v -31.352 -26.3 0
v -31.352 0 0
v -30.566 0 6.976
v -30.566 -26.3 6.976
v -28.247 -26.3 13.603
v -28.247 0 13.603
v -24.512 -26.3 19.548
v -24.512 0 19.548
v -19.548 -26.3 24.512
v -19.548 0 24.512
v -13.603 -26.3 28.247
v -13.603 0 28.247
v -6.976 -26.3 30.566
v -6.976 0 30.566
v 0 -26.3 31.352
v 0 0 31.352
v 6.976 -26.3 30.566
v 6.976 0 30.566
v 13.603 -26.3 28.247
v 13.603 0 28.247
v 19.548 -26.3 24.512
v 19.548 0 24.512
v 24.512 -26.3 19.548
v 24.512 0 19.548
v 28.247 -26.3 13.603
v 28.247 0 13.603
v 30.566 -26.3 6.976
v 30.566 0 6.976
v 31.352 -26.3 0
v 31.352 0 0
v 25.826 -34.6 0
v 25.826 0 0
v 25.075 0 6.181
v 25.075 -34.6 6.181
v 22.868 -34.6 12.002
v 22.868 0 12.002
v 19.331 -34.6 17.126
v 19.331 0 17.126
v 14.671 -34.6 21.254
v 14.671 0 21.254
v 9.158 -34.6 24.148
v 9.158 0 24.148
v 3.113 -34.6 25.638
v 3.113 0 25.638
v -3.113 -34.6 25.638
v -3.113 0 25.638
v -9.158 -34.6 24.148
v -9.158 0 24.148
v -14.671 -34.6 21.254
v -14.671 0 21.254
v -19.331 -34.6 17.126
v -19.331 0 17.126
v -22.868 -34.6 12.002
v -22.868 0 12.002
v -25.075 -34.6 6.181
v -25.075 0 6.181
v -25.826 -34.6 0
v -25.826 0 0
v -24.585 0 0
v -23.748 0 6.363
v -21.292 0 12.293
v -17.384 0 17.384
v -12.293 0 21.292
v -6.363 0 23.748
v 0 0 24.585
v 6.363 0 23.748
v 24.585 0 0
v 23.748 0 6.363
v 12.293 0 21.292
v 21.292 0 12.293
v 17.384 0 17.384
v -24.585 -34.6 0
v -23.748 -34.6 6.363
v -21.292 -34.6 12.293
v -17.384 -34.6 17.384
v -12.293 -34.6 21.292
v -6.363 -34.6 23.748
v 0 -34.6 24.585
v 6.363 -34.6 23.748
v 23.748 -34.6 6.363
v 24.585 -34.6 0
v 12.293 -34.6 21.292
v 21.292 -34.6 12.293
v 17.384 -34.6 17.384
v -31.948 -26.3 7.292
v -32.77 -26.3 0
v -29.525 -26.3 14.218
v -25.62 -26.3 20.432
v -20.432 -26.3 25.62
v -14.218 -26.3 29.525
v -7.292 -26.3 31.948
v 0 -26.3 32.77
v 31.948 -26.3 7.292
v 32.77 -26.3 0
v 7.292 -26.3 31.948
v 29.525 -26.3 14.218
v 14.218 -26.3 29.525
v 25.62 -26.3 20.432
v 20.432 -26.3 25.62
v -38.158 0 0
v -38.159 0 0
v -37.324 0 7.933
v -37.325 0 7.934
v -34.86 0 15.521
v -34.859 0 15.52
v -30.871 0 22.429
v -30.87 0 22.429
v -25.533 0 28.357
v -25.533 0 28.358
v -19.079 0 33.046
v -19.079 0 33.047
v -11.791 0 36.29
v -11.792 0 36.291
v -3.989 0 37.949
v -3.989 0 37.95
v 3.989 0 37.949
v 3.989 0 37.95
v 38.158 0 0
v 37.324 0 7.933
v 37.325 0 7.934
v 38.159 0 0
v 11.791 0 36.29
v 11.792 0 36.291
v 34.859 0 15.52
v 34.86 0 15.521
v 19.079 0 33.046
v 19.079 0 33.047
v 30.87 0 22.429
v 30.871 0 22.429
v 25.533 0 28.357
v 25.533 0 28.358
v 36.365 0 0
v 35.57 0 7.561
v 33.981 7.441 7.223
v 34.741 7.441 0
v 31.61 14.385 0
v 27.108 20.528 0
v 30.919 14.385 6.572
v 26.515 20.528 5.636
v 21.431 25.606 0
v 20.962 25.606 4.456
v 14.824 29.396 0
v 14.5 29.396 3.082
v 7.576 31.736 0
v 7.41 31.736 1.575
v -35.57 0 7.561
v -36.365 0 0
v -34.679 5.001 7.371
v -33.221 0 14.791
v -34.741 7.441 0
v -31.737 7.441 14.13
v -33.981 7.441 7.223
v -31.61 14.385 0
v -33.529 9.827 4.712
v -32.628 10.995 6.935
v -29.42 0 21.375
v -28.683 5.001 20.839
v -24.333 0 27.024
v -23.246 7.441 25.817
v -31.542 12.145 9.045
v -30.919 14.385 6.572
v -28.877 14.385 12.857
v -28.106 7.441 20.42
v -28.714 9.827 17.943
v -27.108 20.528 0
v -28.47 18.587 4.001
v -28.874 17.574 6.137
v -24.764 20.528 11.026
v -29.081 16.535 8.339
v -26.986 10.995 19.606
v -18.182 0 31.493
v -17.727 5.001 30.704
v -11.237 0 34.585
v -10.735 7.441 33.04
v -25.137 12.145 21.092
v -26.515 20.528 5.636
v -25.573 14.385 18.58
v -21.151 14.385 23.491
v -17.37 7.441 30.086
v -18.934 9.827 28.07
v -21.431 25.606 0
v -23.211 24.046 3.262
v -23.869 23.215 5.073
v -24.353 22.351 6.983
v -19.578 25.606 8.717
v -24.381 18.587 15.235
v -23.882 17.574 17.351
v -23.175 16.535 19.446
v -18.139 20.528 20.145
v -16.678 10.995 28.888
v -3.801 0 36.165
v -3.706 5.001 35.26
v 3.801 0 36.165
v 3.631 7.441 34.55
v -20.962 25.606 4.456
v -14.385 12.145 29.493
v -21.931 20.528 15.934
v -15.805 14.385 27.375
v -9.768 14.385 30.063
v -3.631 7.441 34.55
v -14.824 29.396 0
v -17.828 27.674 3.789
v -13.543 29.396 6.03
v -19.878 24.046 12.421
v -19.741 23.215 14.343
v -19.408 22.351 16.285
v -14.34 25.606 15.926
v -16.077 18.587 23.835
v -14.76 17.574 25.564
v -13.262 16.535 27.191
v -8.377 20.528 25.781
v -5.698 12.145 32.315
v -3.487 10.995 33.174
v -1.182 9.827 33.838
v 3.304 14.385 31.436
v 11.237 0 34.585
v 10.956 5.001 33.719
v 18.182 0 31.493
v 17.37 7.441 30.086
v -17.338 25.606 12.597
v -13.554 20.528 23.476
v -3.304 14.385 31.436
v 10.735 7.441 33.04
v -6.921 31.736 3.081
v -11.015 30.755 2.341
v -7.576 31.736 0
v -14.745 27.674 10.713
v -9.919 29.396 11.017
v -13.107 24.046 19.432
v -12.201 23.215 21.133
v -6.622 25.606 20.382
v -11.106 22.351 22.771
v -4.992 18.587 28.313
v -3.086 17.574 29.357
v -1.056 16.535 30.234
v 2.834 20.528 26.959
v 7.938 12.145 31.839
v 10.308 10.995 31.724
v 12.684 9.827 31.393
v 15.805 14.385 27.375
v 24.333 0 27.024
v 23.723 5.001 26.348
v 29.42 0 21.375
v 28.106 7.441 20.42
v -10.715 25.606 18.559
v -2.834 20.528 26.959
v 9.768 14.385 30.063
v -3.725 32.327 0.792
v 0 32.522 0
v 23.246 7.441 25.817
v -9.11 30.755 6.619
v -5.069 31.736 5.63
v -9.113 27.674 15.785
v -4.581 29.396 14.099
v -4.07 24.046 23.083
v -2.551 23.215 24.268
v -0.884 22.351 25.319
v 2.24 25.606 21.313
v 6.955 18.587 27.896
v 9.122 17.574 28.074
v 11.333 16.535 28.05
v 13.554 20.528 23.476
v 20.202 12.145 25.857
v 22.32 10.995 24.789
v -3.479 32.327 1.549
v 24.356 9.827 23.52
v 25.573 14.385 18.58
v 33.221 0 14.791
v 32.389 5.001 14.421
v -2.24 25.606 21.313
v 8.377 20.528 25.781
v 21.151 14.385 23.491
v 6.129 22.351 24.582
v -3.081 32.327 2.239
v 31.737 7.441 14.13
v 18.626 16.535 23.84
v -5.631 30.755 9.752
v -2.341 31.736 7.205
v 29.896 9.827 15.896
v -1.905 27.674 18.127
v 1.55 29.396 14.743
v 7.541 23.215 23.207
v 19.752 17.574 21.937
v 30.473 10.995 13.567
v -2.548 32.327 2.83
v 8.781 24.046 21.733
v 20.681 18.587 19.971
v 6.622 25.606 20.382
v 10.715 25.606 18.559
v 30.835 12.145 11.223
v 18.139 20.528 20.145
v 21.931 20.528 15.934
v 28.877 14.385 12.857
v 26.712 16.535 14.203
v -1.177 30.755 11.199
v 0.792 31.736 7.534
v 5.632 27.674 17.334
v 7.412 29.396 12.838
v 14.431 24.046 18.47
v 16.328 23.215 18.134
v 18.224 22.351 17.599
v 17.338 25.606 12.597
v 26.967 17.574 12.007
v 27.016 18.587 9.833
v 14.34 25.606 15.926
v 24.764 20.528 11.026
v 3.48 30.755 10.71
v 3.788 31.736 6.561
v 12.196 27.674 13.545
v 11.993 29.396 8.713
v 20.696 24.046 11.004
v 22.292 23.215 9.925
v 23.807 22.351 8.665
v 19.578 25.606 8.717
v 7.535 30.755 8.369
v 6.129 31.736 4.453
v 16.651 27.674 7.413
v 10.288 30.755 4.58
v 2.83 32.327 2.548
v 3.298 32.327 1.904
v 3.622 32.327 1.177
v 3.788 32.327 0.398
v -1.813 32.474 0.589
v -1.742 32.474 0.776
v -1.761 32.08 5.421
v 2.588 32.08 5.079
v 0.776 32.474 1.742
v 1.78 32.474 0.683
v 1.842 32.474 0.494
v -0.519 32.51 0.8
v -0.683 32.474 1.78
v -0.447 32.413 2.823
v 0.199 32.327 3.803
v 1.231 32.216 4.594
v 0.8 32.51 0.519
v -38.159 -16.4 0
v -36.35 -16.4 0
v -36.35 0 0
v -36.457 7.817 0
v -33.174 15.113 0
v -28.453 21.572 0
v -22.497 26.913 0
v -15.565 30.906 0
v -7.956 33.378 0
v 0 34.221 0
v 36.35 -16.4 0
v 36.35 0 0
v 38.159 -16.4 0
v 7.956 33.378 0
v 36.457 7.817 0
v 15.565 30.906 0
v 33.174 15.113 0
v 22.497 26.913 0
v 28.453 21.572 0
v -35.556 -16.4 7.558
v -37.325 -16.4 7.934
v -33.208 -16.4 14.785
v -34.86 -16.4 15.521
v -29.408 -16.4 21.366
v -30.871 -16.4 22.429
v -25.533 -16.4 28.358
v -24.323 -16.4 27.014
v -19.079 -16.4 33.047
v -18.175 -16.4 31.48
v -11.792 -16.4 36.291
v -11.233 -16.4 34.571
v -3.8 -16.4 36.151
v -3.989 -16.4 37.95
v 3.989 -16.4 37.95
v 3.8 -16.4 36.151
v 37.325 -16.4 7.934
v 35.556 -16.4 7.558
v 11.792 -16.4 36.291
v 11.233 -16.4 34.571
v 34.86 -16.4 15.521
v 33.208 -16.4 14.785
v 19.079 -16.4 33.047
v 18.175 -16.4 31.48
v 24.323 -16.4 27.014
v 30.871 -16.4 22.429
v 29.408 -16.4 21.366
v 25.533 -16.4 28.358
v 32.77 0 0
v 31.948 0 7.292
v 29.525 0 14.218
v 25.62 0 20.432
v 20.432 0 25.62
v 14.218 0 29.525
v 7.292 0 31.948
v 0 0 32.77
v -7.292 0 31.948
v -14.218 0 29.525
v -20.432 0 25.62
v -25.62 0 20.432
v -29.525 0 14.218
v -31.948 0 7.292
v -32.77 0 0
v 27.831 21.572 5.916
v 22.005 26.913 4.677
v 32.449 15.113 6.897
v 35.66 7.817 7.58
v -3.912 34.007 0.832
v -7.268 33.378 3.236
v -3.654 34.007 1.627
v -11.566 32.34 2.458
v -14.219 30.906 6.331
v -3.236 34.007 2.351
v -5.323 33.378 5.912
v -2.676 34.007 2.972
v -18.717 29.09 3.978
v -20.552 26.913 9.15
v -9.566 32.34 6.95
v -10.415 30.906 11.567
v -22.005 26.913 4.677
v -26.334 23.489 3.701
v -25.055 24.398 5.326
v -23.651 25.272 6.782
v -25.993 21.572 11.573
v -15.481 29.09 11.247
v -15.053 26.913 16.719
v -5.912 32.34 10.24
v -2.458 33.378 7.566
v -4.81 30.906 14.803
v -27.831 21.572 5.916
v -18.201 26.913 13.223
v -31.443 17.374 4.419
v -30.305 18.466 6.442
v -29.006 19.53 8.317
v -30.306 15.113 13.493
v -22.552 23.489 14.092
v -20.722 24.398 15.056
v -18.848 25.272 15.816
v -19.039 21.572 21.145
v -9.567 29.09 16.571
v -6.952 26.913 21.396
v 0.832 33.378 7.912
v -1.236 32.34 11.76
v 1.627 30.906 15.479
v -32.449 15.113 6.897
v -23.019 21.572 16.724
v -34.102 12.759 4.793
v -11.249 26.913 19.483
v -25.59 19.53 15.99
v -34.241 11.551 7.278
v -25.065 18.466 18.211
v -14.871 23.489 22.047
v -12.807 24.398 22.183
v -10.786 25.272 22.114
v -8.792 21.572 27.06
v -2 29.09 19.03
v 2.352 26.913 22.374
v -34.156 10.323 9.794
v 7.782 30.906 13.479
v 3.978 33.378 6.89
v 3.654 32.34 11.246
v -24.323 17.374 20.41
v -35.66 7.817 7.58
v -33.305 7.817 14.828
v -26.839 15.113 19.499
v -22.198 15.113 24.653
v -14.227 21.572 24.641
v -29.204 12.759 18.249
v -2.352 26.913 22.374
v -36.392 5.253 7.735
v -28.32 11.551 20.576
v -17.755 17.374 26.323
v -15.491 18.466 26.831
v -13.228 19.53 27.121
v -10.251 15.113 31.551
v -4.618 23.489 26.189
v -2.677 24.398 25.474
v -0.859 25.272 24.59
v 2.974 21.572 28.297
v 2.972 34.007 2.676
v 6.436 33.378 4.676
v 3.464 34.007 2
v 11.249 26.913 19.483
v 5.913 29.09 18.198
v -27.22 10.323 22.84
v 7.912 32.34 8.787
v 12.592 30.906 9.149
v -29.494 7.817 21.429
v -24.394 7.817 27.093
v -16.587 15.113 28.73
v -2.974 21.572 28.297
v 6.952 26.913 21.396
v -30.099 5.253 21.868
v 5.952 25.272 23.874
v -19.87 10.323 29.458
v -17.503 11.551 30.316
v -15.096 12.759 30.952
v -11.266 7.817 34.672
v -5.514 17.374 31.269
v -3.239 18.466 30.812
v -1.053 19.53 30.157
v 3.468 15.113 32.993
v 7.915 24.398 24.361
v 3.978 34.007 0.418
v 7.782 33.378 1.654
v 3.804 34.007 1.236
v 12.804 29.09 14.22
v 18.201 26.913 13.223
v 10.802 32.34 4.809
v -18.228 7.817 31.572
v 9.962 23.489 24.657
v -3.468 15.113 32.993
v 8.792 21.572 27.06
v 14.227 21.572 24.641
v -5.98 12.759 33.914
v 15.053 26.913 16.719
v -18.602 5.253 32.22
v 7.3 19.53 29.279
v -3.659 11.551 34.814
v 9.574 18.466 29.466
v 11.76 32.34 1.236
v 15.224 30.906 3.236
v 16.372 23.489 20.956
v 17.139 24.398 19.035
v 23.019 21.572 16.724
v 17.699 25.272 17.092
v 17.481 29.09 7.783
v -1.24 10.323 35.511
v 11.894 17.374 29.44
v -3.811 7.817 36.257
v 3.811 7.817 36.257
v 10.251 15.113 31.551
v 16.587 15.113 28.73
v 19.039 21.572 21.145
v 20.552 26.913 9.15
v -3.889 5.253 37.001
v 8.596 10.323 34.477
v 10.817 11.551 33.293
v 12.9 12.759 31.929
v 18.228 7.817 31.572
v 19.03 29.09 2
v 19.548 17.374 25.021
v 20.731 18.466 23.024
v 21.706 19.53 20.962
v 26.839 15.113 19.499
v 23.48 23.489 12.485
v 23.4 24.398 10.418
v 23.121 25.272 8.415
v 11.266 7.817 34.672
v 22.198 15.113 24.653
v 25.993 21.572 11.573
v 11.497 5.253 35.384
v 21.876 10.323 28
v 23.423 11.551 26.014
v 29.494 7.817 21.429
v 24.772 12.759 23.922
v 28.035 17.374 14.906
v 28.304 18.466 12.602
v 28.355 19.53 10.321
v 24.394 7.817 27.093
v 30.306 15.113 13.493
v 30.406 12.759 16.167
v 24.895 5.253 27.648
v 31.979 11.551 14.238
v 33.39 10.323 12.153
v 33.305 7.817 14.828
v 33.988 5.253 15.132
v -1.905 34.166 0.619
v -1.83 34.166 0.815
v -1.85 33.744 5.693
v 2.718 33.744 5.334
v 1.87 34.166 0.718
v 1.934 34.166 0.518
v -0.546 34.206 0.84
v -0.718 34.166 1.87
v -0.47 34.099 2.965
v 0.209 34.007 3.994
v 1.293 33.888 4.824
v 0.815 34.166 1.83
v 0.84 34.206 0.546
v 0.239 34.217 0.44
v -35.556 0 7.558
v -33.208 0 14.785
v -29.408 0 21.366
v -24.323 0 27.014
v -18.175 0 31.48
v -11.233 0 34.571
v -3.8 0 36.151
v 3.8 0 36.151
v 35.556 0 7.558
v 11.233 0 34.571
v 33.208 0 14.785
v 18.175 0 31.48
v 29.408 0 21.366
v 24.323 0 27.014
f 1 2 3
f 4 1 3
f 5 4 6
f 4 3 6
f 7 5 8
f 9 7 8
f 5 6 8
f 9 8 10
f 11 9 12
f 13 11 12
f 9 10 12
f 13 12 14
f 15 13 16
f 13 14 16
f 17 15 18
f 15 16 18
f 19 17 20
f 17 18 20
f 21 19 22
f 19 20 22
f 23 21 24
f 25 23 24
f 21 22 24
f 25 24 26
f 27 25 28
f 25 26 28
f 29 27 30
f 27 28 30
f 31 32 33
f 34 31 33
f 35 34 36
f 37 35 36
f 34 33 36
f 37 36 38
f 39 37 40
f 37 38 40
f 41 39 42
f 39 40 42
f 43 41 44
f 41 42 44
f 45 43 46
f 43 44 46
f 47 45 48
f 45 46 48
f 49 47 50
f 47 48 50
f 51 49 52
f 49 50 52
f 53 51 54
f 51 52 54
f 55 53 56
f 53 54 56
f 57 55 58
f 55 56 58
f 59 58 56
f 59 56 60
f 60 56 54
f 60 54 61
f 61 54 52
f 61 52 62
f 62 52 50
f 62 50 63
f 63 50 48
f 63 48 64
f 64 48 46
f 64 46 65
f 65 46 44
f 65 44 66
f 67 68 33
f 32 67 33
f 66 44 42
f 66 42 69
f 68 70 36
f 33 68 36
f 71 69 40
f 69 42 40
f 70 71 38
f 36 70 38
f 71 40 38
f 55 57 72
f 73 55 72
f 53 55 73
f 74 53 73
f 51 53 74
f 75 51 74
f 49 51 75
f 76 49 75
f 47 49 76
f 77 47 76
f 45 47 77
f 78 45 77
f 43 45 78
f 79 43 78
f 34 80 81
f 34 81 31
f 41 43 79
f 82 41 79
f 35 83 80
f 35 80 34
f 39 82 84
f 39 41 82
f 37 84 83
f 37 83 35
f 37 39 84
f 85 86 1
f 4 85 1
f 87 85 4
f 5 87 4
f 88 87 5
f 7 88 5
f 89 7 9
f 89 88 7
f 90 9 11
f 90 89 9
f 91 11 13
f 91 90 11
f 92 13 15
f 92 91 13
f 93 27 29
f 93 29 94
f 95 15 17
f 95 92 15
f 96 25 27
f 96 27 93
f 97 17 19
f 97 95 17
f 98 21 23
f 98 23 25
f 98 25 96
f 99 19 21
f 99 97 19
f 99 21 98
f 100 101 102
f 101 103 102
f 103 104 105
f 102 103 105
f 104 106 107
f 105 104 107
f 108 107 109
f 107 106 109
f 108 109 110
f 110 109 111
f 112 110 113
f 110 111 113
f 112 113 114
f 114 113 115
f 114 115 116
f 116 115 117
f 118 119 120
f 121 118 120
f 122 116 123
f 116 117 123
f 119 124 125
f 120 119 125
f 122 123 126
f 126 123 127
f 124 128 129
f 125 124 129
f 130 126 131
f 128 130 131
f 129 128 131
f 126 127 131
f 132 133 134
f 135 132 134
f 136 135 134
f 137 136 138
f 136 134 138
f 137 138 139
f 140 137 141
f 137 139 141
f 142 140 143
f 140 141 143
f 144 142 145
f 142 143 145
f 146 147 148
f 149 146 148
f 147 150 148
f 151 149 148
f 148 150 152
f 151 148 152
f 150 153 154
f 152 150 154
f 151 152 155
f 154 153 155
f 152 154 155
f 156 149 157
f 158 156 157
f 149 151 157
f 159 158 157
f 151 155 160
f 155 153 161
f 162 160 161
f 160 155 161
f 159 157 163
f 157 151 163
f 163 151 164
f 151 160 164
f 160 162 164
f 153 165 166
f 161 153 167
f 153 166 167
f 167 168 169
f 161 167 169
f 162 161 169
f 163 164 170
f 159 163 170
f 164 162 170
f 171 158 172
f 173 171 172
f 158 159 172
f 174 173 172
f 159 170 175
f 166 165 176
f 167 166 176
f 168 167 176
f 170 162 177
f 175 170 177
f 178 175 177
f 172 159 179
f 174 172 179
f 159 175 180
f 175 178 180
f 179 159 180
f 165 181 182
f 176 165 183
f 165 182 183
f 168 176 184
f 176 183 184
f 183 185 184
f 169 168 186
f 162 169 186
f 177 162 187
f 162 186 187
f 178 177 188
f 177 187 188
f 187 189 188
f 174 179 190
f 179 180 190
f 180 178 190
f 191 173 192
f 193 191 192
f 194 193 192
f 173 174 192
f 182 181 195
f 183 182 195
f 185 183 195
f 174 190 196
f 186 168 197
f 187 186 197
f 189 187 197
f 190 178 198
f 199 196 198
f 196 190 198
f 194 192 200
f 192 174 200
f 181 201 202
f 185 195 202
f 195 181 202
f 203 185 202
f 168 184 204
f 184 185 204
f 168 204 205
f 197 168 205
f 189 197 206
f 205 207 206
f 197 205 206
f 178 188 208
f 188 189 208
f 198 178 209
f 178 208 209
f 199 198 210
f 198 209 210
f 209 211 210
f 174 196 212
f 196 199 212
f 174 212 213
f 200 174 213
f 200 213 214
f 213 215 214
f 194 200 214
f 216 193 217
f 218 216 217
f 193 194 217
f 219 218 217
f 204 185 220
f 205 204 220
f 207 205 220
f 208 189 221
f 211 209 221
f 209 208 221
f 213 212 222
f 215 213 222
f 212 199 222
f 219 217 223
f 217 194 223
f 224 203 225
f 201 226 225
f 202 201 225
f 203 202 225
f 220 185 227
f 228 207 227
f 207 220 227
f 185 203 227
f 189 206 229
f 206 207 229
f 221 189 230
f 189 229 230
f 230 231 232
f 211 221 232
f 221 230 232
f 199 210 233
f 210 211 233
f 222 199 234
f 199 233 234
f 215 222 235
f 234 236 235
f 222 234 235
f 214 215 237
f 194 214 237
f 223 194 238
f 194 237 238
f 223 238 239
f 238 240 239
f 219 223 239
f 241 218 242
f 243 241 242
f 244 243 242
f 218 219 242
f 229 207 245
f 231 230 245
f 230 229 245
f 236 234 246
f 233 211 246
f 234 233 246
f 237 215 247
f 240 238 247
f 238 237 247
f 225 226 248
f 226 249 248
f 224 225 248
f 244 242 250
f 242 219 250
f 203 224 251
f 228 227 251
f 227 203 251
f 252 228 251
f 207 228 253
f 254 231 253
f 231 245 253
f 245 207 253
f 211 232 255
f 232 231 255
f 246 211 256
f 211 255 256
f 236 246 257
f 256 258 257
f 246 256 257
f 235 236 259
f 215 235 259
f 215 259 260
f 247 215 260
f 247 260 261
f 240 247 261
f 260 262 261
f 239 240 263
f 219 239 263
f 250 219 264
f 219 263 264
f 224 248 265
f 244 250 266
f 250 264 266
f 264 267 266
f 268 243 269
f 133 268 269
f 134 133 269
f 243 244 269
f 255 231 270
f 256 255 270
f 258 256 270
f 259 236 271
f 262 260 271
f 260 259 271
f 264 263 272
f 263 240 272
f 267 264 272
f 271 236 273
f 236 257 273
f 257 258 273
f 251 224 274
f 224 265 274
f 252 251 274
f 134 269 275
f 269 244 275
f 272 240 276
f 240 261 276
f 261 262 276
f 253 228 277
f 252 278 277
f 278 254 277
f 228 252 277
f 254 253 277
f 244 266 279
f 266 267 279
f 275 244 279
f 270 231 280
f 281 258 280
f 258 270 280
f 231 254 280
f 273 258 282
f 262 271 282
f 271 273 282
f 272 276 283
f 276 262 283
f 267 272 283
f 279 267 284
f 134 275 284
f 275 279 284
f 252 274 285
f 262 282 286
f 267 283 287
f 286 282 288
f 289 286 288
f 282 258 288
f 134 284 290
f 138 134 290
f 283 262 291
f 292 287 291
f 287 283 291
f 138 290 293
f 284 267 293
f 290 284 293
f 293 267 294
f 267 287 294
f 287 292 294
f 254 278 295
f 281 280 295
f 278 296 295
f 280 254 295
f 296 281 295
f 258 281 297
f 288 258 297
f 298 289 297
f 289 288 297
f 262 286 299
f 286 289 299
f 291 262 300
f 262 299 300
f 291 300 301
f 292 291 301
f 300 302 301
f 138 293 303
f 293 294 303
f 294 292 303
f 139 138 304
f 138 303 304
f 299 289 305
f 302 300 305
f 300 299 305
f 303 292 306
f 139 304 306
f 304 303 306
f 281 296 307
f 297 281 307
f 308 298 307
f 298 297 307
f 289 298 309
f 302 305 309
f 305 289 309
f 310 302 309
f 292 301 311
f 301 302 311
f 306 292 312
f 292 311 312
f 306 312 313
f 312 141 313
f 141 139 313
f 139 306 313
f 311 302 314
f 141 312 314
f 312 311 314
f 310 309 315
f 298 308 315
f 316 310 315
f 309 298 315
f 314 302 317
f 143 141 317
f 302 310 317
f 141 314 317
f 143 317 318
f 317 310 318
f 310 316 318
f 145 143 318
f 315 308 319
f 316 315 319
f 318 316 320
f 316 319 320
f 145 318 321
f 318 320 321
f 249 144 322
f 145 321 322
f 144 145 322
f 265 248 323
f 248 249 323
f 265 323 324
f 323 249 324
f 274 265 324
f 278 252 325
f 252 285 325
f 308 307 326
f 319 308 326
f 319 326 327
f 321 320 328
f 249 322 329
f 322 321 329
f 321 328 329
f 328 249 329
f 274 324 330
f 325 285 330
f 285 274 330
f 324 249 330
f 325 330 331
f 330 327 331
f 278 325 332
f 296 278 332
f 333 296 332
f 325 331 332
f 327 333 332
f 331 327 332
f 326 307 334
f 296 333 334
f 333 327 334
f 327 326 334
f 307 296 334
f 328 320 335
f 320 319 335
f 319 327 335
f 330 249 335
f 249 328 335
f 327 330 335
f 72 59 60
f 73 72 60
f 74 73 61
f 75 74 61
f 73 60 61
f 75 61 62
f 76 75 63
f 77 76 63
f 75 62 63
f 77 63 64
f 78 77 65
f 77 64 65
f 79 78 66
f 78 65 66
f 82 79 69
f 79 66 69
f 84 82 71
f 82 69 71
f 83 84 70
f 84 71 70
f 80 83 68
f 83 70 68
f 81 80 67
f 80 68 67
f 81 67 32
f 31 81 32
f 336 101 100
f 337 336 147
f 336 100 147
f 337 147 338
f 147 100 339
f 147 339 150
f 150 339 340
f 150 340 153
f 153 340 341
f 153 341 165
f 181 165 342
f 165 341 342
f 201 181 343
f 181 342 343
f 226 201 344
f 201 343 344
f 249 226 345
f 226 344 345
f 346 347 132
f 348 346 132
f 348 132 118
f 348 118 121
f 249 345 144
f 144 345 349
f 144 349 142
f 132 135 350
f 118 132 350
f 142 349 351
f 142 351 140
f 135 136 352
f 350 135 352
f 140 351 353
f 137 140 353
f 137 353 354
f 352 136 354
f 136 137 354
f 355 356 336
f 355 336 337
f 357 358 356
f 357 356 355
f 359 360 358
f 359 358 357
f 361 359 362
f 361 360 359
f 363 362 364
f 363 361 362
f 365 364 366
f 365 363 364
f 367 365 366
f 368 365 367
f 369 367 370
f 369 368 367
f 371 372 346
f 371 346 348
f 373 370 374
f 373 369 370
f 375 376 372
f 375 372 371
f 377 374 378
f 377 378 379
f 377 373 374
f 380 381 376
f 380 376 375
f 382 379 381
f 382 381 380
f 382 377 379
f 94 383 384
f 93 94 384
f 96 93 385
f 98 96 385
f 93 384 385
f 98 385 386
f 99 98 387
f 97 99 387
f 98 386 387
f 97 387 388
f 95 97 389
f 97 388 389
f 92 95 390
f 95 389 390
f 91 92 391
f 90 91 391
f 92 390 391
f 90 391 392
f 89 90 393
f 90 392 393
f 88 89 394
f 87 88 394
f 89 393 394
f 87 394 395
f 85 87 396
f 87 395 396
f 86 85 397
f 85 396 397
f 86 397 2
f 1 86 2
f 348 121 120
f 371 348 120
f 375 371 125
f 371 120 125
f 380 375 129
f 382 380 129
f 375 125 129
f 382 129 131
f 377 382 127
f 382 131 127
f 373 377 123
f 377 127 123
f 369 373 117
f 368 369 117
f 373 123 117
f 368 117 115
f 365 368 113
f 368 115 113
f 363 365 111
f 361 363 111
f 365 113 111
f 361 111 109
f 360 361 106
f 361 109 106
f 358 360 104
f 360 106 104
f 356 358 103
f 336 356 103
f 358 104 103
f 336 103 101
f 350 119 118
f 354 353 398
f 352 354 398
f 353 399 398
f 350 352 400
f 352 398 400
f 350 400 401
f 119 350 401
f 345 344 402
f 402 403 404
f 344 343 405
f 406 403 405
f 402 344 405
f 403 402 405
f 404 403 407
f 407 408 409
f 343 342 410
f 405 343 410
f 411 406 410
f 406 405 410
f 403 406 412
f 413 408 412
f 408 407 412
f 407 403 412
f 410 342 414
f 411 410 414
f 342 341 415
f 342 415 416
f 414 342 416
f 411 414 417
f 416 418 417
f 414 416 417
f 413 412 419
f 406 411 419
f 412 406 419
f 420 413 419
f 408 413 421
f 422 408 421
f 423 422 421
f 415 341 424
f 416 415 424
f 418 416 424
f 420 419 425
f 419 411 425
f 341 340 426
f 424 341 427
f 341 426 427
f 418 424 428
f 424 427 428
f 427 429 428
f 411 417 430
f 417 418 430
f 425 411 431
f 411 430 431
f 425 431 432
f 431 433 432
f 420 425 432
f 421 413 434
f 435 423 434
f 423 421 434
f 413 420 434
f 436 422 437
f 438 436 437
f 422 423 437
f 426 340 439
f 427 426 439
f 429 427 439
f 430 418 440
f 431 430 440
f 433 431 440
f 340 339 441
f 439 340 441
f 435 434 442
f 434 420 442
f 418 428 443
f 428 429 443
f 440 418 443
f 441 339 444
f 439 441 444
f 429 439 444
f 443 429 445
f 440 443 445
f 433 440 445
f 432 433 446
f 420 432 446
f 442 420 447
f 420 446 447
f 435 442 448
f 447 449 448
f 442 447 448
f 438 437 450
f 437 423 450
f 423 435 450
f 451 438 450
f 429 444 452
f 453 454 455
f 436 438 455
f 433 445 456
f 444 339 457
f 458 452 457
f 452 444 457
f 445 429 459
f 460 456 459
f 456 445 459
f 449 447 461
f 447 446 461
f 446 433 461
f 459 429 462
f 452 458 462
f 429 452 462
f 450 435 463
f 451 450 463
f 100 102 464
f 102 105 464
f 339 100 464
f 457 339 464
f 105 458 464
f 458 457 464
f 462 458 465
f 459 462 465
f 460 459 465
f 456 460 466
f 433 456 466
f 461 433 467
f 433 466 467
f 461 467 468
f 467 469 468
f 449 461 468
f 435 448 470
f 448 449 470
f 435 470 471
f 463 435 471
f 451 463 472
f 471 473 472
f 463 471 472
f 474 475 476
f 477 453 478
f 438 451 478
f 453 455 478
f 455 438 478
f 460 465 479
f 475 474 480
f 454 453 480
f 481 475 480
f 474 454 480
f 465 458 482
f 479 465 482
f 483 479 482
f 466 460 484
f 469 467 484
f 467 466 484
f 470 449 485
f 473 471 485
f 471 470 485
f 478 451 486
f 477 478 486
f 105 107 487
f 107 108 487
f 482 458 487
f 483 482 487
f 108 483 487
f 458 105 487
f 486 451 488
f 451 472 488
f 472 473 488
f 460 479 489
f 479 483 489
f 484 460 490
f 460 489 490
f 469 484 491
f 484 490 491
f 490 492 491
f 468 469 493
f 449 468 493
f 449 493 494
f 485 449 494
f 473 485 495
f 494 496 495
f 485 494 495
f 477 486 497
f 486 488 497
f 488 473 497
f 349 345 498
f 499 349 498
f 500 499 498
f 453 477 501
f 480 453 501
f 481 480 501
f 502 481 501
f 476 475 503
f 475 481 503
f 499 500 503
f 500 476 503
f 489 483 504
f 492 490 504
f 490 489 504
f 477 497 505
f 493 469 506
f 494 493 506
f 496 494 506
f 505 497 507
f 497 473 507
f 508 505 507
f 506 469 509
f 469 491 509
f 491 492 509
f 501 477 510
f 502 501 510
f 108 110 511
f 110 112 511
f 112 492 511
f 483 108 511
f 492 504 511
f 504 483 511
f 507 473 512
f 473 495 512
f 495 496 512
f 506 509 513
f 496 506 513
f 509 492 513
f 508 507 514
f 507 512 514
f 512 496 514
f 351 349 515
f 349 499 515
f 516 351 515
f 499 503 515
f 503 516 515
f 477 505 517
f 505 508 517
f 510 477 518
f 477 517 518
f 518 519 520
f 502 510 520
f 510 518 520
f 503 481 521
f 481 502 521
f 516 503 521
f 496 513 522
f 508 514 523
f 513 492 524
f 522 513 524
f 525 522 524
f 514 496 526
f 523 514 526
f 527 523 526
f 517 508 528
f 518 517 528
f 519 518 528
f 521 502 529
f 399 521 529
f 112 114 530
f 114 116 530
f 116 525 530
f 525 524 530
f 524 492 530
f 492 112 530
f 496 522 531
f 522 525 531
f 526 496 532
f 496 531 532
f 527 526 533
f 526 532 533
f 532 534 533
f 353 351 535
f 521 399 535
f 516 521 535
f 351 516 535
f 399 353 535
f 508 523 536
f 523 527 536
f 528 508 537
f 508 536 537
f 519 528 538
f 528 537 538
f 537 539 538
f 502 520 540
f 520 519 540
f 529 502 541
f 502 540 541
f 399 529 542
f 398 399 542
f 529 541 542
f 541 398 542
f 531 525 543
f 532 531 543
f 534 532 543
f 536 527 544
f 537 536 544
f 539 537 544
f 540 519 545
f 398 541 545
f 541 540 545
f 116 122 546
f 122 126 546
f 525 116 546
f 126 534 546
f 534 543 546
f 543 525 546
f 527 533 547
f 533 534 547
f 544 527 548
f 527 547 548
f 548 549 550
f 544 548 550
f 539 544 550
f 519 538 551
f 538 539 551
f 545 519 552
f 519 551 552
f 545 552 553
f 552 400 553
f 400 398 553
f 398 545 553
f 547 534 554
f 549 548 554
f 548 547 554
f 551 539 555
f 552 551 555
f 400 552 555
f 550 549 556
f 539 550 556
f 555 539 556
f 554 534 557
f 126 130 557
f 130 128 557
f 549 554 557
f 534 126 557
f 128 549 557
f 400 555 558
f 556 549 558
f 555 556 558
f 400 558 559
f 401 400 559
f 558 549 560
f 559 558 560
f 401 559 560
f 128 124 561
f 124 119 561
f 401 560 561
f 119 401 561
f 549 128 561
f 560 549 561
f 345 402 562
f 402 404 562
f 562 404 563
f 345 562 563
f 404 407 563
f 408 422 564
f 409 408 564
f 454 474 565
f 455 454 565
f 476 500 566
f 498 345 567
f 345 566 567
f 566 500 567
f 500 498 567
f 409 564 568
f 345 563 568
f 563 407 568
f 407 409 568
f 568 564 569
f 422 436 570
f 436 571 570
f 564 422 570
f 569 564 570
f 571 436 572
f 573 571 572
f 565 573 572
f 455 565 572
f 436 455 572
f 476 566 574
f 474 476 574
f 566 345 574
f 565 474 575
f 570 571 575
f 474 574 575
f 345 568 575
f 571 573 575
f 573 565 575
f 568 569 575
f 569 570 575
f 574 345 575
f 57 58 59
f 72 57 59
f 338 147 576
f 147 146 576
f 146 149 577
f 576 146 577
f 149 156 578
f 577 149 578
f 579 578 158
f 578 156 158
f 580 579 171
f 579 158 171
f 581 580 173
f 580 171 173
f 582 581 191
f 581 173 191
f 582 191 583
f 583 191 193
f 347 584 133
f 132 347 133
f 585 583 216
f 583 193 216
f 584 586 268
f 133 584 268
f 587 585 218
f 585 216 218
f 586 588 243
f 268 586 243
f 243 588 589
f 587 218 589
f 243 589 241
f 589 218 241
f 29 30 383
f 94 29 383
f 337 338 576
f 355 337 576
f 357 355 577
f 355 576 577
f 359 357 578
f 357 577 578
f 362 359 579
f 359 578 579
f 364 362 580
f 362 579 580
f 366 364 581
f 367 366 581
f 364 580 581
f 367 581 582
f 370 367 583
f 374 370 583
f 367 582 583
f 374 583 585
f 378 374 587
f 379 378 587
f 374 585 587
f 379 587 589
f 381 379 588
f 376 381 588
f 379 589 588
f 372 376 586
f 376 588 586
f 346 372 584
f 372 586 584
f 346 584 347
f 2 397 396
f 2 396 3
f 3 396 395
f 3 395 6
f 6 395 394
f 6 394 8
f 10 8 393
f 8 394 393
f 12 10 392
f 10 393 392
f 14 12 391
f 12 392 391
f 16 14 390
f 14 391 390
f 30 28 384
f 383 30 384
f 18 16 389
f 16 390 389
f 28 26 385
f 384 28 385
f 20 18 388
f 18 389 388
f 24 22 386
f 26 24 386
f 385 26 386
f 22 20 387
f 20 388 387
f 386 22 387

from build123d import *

# Parameters (mm, degrees)
F1_DEPTH = 34.6
F2_DEPTH = 26.3
F3_DEPTH = 16.4
F5_ANGLE = 180


with BuildPart() as f1:
    # F0 (on Front) → F1 (new body)
    with BuildSketch(Plane.XZ):
        with BuildLine():
            ThreePointArc((-24.58537, 0), (0, 24.58537), (24.58537, 0))
            Line((24.58537, 0), (25.825808, 0))
            ThreePointArc((25.825808, 0), (0, 25.825808), (-25.825808, 0))
            Line((-25.825808, 0), (-24.58537, 0))
        make_face()
    extrude(amount=F1_DEPTH)


with BuildPart() as f2:
    # F0 (on Front) → F2 (new body)
    with BuildSketch(Plane.XZ):
        with BuildLine():
            ThreePointArc((-31.352004, 0), (0, 31.352004), (31.352004, 0))
            Line((31.352004, 0), (32.769805, 0))
            ThreePointArc((32.769805, 0), (0, 32.769805), (-32.769805, 0))
            Line((-32.769805, 0), (-31.352004, 0))
        make_face()
    extrude(amount=F2_DEPTH)


with BuildPart() as f3:
    # F0 (on Front) → F3 (new body)
    with BuildSketch(Plane.XZ):
        with BuildLine():
            ThreePointArc((-36.350254, 0), (0, 36.350254), (36.350254, 0))
            Line((36.350254, 0), (38.15886, 0))
            ThreePointArc((38.15886, 0), (0, 38.15886), (-38.15886, 0))
            Line((-38.15886, 0), (-36.350254, 0))
        make_face()
    extrude(amount=F3_DEPTH)

    # F4 (on Top) → F5 (revolve)
    with BuildSketch(Plane.XY):
        with BuildLine():
            Line((0, 32.52184), (0, 34.220715))
            ThreePointArc((0, 34.220715), (-25.61438, 24.397741), (-38.157806, 0))
            Line((-38.157806, 0), (-36.364555, 0))
            ThreePointArc((-36.364555, 0), (-24.401783, 23.215309), (0, 32.52184))
        make_face()
    revolve(axis=Axis((0, 17.110357, 0), (0, 1, 0)), revolution_arc=F5_ANGLE)


solid = Compound([f1.part, f2.part, f3.part])
